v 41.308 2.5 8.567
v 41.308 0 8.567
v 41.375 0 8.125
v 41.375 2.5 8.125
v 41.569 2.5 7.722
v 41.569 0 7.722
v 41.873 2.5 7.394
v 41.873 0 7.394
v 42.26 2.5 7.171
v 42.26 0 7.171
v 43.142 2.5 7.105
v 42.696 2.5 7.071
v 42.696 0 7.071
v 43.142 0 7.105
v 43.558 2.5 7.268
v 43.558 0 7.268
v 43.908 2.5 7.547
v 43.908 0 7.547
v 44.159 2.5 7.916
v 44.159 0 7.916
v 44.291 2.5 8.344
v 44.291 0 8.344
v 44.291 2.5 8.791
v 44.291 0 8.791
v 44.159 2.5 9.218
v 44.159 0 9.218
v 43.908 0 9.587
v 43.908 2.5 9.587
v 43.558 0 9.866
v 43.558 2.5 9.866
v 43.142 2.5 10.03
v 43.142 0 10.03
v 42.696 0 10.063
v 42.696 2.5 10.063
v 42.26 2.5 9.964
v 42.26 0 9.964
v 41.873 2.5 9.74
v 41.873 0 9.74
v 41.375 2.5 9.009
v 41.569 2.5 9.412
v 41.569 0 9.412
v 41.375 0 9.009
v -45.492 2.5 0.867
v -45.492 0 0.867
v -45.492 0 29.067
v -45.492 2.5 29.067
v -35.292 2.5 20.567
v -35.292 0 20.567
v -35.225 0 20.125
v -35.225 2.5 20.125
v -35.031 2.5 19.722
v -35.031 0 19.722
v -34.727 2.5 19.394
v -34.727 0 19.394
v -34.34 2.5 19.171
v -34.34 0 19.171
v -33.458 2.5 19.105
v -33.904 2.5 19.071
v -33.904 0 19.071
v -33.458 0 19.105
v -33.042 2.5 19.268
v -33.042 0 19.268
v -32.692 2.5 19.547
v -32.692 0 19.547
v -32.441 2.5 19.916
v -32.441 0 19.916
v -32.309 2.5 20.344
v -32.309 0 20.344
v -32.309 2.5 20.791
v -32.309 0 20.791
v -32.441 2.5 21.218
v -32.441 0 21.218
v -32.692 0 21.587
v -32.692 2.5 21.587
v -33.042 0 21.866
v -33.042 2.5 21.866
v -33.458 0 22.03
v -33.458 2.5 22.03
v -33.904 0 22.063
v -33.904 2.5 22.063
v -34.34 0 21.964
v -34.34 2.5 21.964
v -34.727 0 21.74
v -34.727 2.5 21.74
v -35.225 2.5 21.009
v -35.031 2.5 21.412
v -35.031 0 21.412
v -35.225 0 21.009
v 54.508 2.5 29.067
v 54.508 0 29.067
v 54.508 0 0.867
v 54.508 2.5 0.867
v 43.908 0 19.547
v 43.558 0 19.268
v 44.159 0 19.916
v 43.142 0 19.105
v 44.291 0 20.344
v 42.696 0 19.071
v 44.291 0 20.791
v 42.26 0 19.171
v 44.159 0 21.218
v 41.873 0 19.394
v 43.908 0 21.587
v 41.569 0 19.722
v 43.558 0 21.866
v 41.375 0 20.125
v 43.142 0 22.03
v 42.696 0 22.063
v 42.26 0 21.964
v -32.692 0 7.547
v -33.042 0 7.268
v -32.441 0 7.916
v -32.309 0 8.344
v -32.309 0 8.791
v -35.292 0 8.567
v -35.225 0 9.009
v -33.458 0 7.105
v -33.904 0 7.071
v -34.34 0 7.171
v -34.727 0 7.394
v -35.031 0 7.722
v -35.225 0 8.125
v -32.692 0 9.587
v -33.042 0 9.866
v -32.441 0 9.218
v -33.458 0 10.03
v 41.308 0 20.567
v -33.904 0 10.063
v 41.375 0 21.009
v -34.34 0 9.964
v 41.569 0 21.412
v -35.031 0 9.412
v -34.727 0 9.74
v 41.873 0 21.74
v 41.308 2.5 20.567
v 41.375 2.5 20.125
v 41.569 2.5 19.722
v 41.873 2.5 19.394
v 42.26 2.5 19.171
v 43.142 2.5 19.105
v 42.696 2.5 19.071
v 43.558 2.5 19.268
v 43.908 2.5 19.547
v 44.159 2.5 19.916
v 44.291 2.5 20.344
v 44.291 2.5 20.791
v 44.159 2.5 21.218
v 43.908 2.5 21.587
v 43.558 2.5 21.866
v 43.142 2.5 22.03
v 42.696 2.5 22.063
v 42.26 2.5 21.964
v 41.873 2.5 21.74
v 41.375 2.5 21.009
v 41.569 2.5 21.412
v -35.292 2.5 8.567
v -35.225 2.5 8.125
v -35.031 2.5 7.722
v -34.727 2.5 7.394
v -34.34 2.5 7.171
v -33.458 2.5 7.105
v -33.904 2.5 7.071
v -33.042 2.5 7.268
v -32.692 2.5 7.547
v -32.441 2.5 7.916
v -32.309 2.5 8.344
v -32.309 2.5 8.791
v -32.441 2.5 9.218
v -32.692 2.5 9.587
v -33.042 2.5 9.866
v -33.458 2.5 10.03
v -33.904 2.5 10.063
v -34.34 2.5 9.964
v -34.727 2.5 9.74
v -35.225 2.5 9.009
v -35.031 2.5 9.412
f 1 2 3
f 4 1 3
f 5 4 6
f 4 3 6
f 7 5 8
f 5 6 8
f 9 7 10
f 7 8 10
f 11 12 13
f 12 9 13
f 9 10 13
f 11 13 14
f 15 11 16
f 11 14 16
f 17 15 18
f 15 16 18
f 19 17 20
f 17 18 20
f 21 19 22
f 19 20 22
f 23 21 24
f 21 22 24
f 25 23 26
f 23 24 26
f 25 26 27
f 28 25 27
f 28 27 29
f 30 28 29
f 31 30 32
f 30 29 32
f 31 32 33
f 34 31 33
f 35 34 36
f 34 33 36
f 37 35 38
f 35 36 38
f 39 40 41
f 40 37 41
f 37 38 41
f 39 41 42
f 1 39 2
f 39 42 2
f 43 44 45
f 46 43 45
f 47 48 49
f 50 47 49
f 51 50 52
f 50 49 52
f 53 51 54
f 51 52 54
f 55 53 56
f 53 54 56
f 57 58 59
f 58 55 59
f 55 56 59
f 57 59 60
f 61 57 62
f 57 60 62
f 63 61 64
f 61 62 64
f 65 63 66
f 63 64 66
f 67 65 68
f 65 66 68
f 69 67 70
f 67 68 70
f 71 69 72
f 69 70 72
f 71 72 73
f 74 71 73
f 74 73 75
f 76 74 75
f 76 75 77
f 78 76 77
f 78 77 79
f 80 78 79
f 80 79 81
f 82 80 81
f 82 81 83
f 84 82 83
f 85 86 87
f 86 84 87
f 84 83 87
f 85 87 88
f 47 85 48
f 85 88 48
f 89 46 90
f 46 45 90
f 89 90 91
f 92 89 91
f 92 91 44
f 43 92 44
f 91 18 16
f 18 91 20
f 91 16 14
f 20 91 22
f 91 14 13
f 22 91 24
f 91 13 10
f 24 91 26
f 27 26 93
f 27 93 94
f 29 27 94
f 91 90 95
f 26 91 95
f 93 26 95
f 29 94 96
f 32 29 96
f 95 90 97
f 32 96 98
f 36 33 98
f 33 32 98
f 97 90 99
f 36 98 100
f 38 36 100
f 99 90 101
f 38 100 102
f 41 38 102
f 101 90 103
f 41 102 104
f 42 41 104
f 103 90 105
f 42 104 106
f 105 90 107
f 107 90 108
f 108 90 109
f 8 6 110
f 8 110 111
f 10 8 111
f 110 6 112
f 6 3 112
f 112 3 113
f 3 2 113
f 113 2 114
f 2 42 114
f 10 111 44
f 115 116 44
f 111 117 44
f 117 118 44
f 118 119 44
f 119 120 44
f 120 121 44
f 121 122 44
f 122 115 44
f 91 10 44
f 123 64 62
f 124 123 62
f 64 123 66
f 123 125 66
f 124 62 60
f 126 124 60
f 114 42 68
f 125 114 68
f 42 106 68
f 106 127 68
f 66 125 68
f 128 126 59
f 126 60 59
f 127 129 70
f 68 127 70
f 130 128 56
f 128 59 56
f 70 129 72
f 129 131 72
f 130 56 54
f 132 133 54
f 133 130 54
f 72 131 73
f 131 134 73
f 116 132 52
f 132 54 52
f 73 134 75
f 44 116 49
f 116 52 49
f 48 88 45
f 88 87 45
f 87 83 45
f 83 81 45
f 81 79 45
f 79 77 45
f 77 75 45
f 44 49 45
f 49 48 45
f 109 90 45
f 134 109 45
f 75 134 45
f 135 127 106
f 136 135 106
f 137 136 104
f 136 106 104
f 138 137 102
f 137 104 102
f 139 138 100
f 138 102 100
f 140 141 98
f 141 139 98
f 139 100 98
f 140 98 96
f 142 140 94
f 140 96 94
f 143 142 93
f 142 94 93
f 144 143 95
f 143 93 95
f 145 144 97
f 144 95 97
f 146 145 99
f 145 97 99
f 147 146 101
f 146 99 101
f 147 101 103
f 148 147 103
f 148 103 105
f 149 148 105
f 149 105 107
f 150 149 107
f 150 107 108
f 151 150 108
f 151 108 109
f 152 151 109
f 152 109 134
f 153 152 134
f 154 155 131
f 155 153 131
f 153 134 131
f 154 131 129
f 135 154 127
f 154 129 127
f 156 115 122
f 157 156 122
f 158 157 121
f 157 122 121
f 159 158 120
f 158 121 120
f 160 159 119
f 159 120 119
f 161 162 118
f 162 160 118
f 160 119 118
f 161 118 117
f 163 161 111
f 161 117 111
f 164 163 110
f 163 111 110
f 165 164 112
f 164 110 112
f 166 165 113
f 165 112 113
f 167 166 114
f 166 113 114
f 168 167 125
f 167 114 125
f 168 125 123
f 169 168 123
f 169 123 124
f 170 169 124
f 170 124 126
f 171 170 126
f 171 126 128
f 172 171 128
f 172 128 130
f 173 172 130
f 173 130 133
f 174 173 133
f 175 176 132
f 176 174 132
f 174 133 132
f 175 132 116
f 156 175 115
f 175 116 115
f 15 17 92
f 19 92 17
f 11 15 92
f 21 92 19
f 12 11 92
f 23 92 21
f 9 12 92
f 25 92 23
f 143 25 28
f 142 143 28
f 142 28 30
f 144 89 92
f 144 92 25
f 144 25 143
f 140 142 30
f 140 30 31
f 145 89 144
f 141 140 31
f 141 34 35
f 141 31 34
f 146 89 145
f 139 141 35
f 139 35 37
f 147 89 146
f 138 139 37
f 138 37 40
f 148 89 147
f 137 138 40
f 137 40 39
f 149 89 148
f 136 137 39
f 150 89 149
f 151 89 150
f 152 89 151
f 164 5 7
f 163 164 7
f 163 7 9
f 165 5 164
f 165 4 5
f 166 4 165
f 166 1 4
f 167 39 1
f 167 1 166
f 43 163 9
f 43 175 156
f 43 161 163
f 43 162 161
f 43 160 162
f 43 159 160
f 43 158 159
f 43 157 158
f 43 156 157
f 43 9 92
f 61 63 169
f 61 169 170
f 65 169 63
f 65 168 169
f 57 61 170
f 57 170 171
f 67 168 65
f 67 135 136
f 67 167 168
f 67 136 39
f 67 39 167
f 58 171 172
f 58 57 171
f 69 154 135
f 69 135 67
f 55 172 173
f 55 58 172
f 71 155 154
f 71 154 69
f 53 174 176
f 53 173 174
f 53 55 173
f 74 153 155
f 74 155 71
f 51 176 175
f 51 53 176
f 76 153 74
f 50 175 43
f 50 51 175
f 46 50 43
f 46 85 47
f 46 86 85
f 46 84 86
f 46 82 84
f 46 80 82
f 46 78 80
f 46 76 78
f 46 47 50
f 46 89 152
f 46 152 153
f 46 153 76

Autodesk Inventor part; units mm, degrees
ref_plane "YZ Plane" through (0, 0, 0) normal (1, 0, 0) x (0, 1, 0)
ref_plane "XZ Plane" through (0, 0, 0) normal (0, 1, 0) x (-1, 0, 0)
ref_plane "XY Plane" through (0, 0, 0) normal (0, 0, 1) x (1, 0, 0)
sketch "Sketch2" plane through (0, 0, 0) normal (0, 1, 0) x (-1, 0, 0)
  line L0 (-48.208, 12.0672) -> (-48.208, 5.8672) construction
  line L1 (-48.208, 12.0672) -> (43.792, 12.0672) construction
  line L2 (43.792, 12.0672) -> (43.792, 5.8672) construction
  line L3 (37.542, 5.8672) -> (43.792, 5.8672) construction
  line L4 (37.542, 5.8672) -> (37.2414, 5.5672) construction
  line L5 (37.2414, 5.5672) -> (30.3425, 5.5672) construction
  line L6 (30.3425, 5.5672) -> (30.042, 5.8672) construction
  line L7 (-39.058, 5.8672) -> (30.042, 5.8672) construction
  line L8 (-39.058, 5.8672) -> (-39.3586, 5.5672) construction
  line L9 (-39.3586, 5.5672) -> (-46.2575, 5.5672) construction
  line L10 (-46.2575, 5.5672) -> (-46.558, 5.8672) construction
  line L11 (-48.208, 5.8672) -> (-46.558, 5.8672) construction
  circle A0 centre (-42.808, 8.5672) radius 1.25 construction
  circle A1 centre (33.792, 8.5672) radius 1.25 construction
  circle A2 centre (33.792, 8.5672) radius 1.5
  circle A3 centre (-42.808, 8.5672) radius 1.5
  line L12 (45.492, 29.0672) -> (-54.508, 29.0672)
  line L13 (-54.508, 29.0672) -> (-54.508, 0.8672)
  line L14 (-54.508, 0.8672) -> (45.492, 0.8672)
  line L15 (45.492, 0.8672) -> (45.492, 29.0672)
  line L16 (-42.808, 8.5672) -> (33.792, 8.5672) construction
  line L17 (-4.508, 8.5672) -> (-4.508, 29.0672) construction
  line L18 (-48.208, 24.0672) -> (-48.208, 17.8672) construction
  line L19 (-48.208, 24.0672) -> (43.792, 24.0672) construction
  line L20 (43.792, 24.0672) -> (43.792, 17.8672) construction
  line L21 (37.542, 17.8672) -> (43.792, 17.8672) construction
  line L22 (37.542, 17.8672) -> (37.2414, 17.5672) construction
  line L23 (37.2414, 17.5672) -> (30.3425, 17.5672) construction
  line L24 (30.3425, 17.5672) -> (30.042, 17.8672) construction
  line L25 (-39.058, 17.8672) -> (30.042, 17.8672) construction
  line L26 (-39.058, 17.8672) -> (-39.3586, 17.5672) construction
  line L27 (-39.3586, 17.5672) -> (-46.2575, 17.5672) construction
  line L28 (-46.2575, 17.5672) -> (-46.558, 17.8672) construction
  line L29 (-48.208, 17.8672) -> (-46.558, 17.8672) construction
  circle A4 centre (-42.808, 20.5672) radius 1.25 construction
  circle A5 centre (33.792, 20.5672) radius 1.25 construction
  circle A6 centre (33.792, 20.5672) radius 1.5
  circle A7 centre (-42.808, 20.5672) radius 1.5
  point P0 (0, 0)
  dimension "d0" = 3
  dimension "d1" = 3
  dimension "d2" = 76.6
  dimension "d3" = 100
  dimension "d4" = 3
  dimension "d5" = 3
  dimension "d6" = 5
  dimension "d7" = 5
extrude "Extrusion1" add sketch "Sketch2" along normal blind 2.5
equation "\"d1\" = d0"
equation "\"d4\" = d0"
equation "\"d5\" = d4"
equation "\"d7\" = d6"
properties part number "A-05"
